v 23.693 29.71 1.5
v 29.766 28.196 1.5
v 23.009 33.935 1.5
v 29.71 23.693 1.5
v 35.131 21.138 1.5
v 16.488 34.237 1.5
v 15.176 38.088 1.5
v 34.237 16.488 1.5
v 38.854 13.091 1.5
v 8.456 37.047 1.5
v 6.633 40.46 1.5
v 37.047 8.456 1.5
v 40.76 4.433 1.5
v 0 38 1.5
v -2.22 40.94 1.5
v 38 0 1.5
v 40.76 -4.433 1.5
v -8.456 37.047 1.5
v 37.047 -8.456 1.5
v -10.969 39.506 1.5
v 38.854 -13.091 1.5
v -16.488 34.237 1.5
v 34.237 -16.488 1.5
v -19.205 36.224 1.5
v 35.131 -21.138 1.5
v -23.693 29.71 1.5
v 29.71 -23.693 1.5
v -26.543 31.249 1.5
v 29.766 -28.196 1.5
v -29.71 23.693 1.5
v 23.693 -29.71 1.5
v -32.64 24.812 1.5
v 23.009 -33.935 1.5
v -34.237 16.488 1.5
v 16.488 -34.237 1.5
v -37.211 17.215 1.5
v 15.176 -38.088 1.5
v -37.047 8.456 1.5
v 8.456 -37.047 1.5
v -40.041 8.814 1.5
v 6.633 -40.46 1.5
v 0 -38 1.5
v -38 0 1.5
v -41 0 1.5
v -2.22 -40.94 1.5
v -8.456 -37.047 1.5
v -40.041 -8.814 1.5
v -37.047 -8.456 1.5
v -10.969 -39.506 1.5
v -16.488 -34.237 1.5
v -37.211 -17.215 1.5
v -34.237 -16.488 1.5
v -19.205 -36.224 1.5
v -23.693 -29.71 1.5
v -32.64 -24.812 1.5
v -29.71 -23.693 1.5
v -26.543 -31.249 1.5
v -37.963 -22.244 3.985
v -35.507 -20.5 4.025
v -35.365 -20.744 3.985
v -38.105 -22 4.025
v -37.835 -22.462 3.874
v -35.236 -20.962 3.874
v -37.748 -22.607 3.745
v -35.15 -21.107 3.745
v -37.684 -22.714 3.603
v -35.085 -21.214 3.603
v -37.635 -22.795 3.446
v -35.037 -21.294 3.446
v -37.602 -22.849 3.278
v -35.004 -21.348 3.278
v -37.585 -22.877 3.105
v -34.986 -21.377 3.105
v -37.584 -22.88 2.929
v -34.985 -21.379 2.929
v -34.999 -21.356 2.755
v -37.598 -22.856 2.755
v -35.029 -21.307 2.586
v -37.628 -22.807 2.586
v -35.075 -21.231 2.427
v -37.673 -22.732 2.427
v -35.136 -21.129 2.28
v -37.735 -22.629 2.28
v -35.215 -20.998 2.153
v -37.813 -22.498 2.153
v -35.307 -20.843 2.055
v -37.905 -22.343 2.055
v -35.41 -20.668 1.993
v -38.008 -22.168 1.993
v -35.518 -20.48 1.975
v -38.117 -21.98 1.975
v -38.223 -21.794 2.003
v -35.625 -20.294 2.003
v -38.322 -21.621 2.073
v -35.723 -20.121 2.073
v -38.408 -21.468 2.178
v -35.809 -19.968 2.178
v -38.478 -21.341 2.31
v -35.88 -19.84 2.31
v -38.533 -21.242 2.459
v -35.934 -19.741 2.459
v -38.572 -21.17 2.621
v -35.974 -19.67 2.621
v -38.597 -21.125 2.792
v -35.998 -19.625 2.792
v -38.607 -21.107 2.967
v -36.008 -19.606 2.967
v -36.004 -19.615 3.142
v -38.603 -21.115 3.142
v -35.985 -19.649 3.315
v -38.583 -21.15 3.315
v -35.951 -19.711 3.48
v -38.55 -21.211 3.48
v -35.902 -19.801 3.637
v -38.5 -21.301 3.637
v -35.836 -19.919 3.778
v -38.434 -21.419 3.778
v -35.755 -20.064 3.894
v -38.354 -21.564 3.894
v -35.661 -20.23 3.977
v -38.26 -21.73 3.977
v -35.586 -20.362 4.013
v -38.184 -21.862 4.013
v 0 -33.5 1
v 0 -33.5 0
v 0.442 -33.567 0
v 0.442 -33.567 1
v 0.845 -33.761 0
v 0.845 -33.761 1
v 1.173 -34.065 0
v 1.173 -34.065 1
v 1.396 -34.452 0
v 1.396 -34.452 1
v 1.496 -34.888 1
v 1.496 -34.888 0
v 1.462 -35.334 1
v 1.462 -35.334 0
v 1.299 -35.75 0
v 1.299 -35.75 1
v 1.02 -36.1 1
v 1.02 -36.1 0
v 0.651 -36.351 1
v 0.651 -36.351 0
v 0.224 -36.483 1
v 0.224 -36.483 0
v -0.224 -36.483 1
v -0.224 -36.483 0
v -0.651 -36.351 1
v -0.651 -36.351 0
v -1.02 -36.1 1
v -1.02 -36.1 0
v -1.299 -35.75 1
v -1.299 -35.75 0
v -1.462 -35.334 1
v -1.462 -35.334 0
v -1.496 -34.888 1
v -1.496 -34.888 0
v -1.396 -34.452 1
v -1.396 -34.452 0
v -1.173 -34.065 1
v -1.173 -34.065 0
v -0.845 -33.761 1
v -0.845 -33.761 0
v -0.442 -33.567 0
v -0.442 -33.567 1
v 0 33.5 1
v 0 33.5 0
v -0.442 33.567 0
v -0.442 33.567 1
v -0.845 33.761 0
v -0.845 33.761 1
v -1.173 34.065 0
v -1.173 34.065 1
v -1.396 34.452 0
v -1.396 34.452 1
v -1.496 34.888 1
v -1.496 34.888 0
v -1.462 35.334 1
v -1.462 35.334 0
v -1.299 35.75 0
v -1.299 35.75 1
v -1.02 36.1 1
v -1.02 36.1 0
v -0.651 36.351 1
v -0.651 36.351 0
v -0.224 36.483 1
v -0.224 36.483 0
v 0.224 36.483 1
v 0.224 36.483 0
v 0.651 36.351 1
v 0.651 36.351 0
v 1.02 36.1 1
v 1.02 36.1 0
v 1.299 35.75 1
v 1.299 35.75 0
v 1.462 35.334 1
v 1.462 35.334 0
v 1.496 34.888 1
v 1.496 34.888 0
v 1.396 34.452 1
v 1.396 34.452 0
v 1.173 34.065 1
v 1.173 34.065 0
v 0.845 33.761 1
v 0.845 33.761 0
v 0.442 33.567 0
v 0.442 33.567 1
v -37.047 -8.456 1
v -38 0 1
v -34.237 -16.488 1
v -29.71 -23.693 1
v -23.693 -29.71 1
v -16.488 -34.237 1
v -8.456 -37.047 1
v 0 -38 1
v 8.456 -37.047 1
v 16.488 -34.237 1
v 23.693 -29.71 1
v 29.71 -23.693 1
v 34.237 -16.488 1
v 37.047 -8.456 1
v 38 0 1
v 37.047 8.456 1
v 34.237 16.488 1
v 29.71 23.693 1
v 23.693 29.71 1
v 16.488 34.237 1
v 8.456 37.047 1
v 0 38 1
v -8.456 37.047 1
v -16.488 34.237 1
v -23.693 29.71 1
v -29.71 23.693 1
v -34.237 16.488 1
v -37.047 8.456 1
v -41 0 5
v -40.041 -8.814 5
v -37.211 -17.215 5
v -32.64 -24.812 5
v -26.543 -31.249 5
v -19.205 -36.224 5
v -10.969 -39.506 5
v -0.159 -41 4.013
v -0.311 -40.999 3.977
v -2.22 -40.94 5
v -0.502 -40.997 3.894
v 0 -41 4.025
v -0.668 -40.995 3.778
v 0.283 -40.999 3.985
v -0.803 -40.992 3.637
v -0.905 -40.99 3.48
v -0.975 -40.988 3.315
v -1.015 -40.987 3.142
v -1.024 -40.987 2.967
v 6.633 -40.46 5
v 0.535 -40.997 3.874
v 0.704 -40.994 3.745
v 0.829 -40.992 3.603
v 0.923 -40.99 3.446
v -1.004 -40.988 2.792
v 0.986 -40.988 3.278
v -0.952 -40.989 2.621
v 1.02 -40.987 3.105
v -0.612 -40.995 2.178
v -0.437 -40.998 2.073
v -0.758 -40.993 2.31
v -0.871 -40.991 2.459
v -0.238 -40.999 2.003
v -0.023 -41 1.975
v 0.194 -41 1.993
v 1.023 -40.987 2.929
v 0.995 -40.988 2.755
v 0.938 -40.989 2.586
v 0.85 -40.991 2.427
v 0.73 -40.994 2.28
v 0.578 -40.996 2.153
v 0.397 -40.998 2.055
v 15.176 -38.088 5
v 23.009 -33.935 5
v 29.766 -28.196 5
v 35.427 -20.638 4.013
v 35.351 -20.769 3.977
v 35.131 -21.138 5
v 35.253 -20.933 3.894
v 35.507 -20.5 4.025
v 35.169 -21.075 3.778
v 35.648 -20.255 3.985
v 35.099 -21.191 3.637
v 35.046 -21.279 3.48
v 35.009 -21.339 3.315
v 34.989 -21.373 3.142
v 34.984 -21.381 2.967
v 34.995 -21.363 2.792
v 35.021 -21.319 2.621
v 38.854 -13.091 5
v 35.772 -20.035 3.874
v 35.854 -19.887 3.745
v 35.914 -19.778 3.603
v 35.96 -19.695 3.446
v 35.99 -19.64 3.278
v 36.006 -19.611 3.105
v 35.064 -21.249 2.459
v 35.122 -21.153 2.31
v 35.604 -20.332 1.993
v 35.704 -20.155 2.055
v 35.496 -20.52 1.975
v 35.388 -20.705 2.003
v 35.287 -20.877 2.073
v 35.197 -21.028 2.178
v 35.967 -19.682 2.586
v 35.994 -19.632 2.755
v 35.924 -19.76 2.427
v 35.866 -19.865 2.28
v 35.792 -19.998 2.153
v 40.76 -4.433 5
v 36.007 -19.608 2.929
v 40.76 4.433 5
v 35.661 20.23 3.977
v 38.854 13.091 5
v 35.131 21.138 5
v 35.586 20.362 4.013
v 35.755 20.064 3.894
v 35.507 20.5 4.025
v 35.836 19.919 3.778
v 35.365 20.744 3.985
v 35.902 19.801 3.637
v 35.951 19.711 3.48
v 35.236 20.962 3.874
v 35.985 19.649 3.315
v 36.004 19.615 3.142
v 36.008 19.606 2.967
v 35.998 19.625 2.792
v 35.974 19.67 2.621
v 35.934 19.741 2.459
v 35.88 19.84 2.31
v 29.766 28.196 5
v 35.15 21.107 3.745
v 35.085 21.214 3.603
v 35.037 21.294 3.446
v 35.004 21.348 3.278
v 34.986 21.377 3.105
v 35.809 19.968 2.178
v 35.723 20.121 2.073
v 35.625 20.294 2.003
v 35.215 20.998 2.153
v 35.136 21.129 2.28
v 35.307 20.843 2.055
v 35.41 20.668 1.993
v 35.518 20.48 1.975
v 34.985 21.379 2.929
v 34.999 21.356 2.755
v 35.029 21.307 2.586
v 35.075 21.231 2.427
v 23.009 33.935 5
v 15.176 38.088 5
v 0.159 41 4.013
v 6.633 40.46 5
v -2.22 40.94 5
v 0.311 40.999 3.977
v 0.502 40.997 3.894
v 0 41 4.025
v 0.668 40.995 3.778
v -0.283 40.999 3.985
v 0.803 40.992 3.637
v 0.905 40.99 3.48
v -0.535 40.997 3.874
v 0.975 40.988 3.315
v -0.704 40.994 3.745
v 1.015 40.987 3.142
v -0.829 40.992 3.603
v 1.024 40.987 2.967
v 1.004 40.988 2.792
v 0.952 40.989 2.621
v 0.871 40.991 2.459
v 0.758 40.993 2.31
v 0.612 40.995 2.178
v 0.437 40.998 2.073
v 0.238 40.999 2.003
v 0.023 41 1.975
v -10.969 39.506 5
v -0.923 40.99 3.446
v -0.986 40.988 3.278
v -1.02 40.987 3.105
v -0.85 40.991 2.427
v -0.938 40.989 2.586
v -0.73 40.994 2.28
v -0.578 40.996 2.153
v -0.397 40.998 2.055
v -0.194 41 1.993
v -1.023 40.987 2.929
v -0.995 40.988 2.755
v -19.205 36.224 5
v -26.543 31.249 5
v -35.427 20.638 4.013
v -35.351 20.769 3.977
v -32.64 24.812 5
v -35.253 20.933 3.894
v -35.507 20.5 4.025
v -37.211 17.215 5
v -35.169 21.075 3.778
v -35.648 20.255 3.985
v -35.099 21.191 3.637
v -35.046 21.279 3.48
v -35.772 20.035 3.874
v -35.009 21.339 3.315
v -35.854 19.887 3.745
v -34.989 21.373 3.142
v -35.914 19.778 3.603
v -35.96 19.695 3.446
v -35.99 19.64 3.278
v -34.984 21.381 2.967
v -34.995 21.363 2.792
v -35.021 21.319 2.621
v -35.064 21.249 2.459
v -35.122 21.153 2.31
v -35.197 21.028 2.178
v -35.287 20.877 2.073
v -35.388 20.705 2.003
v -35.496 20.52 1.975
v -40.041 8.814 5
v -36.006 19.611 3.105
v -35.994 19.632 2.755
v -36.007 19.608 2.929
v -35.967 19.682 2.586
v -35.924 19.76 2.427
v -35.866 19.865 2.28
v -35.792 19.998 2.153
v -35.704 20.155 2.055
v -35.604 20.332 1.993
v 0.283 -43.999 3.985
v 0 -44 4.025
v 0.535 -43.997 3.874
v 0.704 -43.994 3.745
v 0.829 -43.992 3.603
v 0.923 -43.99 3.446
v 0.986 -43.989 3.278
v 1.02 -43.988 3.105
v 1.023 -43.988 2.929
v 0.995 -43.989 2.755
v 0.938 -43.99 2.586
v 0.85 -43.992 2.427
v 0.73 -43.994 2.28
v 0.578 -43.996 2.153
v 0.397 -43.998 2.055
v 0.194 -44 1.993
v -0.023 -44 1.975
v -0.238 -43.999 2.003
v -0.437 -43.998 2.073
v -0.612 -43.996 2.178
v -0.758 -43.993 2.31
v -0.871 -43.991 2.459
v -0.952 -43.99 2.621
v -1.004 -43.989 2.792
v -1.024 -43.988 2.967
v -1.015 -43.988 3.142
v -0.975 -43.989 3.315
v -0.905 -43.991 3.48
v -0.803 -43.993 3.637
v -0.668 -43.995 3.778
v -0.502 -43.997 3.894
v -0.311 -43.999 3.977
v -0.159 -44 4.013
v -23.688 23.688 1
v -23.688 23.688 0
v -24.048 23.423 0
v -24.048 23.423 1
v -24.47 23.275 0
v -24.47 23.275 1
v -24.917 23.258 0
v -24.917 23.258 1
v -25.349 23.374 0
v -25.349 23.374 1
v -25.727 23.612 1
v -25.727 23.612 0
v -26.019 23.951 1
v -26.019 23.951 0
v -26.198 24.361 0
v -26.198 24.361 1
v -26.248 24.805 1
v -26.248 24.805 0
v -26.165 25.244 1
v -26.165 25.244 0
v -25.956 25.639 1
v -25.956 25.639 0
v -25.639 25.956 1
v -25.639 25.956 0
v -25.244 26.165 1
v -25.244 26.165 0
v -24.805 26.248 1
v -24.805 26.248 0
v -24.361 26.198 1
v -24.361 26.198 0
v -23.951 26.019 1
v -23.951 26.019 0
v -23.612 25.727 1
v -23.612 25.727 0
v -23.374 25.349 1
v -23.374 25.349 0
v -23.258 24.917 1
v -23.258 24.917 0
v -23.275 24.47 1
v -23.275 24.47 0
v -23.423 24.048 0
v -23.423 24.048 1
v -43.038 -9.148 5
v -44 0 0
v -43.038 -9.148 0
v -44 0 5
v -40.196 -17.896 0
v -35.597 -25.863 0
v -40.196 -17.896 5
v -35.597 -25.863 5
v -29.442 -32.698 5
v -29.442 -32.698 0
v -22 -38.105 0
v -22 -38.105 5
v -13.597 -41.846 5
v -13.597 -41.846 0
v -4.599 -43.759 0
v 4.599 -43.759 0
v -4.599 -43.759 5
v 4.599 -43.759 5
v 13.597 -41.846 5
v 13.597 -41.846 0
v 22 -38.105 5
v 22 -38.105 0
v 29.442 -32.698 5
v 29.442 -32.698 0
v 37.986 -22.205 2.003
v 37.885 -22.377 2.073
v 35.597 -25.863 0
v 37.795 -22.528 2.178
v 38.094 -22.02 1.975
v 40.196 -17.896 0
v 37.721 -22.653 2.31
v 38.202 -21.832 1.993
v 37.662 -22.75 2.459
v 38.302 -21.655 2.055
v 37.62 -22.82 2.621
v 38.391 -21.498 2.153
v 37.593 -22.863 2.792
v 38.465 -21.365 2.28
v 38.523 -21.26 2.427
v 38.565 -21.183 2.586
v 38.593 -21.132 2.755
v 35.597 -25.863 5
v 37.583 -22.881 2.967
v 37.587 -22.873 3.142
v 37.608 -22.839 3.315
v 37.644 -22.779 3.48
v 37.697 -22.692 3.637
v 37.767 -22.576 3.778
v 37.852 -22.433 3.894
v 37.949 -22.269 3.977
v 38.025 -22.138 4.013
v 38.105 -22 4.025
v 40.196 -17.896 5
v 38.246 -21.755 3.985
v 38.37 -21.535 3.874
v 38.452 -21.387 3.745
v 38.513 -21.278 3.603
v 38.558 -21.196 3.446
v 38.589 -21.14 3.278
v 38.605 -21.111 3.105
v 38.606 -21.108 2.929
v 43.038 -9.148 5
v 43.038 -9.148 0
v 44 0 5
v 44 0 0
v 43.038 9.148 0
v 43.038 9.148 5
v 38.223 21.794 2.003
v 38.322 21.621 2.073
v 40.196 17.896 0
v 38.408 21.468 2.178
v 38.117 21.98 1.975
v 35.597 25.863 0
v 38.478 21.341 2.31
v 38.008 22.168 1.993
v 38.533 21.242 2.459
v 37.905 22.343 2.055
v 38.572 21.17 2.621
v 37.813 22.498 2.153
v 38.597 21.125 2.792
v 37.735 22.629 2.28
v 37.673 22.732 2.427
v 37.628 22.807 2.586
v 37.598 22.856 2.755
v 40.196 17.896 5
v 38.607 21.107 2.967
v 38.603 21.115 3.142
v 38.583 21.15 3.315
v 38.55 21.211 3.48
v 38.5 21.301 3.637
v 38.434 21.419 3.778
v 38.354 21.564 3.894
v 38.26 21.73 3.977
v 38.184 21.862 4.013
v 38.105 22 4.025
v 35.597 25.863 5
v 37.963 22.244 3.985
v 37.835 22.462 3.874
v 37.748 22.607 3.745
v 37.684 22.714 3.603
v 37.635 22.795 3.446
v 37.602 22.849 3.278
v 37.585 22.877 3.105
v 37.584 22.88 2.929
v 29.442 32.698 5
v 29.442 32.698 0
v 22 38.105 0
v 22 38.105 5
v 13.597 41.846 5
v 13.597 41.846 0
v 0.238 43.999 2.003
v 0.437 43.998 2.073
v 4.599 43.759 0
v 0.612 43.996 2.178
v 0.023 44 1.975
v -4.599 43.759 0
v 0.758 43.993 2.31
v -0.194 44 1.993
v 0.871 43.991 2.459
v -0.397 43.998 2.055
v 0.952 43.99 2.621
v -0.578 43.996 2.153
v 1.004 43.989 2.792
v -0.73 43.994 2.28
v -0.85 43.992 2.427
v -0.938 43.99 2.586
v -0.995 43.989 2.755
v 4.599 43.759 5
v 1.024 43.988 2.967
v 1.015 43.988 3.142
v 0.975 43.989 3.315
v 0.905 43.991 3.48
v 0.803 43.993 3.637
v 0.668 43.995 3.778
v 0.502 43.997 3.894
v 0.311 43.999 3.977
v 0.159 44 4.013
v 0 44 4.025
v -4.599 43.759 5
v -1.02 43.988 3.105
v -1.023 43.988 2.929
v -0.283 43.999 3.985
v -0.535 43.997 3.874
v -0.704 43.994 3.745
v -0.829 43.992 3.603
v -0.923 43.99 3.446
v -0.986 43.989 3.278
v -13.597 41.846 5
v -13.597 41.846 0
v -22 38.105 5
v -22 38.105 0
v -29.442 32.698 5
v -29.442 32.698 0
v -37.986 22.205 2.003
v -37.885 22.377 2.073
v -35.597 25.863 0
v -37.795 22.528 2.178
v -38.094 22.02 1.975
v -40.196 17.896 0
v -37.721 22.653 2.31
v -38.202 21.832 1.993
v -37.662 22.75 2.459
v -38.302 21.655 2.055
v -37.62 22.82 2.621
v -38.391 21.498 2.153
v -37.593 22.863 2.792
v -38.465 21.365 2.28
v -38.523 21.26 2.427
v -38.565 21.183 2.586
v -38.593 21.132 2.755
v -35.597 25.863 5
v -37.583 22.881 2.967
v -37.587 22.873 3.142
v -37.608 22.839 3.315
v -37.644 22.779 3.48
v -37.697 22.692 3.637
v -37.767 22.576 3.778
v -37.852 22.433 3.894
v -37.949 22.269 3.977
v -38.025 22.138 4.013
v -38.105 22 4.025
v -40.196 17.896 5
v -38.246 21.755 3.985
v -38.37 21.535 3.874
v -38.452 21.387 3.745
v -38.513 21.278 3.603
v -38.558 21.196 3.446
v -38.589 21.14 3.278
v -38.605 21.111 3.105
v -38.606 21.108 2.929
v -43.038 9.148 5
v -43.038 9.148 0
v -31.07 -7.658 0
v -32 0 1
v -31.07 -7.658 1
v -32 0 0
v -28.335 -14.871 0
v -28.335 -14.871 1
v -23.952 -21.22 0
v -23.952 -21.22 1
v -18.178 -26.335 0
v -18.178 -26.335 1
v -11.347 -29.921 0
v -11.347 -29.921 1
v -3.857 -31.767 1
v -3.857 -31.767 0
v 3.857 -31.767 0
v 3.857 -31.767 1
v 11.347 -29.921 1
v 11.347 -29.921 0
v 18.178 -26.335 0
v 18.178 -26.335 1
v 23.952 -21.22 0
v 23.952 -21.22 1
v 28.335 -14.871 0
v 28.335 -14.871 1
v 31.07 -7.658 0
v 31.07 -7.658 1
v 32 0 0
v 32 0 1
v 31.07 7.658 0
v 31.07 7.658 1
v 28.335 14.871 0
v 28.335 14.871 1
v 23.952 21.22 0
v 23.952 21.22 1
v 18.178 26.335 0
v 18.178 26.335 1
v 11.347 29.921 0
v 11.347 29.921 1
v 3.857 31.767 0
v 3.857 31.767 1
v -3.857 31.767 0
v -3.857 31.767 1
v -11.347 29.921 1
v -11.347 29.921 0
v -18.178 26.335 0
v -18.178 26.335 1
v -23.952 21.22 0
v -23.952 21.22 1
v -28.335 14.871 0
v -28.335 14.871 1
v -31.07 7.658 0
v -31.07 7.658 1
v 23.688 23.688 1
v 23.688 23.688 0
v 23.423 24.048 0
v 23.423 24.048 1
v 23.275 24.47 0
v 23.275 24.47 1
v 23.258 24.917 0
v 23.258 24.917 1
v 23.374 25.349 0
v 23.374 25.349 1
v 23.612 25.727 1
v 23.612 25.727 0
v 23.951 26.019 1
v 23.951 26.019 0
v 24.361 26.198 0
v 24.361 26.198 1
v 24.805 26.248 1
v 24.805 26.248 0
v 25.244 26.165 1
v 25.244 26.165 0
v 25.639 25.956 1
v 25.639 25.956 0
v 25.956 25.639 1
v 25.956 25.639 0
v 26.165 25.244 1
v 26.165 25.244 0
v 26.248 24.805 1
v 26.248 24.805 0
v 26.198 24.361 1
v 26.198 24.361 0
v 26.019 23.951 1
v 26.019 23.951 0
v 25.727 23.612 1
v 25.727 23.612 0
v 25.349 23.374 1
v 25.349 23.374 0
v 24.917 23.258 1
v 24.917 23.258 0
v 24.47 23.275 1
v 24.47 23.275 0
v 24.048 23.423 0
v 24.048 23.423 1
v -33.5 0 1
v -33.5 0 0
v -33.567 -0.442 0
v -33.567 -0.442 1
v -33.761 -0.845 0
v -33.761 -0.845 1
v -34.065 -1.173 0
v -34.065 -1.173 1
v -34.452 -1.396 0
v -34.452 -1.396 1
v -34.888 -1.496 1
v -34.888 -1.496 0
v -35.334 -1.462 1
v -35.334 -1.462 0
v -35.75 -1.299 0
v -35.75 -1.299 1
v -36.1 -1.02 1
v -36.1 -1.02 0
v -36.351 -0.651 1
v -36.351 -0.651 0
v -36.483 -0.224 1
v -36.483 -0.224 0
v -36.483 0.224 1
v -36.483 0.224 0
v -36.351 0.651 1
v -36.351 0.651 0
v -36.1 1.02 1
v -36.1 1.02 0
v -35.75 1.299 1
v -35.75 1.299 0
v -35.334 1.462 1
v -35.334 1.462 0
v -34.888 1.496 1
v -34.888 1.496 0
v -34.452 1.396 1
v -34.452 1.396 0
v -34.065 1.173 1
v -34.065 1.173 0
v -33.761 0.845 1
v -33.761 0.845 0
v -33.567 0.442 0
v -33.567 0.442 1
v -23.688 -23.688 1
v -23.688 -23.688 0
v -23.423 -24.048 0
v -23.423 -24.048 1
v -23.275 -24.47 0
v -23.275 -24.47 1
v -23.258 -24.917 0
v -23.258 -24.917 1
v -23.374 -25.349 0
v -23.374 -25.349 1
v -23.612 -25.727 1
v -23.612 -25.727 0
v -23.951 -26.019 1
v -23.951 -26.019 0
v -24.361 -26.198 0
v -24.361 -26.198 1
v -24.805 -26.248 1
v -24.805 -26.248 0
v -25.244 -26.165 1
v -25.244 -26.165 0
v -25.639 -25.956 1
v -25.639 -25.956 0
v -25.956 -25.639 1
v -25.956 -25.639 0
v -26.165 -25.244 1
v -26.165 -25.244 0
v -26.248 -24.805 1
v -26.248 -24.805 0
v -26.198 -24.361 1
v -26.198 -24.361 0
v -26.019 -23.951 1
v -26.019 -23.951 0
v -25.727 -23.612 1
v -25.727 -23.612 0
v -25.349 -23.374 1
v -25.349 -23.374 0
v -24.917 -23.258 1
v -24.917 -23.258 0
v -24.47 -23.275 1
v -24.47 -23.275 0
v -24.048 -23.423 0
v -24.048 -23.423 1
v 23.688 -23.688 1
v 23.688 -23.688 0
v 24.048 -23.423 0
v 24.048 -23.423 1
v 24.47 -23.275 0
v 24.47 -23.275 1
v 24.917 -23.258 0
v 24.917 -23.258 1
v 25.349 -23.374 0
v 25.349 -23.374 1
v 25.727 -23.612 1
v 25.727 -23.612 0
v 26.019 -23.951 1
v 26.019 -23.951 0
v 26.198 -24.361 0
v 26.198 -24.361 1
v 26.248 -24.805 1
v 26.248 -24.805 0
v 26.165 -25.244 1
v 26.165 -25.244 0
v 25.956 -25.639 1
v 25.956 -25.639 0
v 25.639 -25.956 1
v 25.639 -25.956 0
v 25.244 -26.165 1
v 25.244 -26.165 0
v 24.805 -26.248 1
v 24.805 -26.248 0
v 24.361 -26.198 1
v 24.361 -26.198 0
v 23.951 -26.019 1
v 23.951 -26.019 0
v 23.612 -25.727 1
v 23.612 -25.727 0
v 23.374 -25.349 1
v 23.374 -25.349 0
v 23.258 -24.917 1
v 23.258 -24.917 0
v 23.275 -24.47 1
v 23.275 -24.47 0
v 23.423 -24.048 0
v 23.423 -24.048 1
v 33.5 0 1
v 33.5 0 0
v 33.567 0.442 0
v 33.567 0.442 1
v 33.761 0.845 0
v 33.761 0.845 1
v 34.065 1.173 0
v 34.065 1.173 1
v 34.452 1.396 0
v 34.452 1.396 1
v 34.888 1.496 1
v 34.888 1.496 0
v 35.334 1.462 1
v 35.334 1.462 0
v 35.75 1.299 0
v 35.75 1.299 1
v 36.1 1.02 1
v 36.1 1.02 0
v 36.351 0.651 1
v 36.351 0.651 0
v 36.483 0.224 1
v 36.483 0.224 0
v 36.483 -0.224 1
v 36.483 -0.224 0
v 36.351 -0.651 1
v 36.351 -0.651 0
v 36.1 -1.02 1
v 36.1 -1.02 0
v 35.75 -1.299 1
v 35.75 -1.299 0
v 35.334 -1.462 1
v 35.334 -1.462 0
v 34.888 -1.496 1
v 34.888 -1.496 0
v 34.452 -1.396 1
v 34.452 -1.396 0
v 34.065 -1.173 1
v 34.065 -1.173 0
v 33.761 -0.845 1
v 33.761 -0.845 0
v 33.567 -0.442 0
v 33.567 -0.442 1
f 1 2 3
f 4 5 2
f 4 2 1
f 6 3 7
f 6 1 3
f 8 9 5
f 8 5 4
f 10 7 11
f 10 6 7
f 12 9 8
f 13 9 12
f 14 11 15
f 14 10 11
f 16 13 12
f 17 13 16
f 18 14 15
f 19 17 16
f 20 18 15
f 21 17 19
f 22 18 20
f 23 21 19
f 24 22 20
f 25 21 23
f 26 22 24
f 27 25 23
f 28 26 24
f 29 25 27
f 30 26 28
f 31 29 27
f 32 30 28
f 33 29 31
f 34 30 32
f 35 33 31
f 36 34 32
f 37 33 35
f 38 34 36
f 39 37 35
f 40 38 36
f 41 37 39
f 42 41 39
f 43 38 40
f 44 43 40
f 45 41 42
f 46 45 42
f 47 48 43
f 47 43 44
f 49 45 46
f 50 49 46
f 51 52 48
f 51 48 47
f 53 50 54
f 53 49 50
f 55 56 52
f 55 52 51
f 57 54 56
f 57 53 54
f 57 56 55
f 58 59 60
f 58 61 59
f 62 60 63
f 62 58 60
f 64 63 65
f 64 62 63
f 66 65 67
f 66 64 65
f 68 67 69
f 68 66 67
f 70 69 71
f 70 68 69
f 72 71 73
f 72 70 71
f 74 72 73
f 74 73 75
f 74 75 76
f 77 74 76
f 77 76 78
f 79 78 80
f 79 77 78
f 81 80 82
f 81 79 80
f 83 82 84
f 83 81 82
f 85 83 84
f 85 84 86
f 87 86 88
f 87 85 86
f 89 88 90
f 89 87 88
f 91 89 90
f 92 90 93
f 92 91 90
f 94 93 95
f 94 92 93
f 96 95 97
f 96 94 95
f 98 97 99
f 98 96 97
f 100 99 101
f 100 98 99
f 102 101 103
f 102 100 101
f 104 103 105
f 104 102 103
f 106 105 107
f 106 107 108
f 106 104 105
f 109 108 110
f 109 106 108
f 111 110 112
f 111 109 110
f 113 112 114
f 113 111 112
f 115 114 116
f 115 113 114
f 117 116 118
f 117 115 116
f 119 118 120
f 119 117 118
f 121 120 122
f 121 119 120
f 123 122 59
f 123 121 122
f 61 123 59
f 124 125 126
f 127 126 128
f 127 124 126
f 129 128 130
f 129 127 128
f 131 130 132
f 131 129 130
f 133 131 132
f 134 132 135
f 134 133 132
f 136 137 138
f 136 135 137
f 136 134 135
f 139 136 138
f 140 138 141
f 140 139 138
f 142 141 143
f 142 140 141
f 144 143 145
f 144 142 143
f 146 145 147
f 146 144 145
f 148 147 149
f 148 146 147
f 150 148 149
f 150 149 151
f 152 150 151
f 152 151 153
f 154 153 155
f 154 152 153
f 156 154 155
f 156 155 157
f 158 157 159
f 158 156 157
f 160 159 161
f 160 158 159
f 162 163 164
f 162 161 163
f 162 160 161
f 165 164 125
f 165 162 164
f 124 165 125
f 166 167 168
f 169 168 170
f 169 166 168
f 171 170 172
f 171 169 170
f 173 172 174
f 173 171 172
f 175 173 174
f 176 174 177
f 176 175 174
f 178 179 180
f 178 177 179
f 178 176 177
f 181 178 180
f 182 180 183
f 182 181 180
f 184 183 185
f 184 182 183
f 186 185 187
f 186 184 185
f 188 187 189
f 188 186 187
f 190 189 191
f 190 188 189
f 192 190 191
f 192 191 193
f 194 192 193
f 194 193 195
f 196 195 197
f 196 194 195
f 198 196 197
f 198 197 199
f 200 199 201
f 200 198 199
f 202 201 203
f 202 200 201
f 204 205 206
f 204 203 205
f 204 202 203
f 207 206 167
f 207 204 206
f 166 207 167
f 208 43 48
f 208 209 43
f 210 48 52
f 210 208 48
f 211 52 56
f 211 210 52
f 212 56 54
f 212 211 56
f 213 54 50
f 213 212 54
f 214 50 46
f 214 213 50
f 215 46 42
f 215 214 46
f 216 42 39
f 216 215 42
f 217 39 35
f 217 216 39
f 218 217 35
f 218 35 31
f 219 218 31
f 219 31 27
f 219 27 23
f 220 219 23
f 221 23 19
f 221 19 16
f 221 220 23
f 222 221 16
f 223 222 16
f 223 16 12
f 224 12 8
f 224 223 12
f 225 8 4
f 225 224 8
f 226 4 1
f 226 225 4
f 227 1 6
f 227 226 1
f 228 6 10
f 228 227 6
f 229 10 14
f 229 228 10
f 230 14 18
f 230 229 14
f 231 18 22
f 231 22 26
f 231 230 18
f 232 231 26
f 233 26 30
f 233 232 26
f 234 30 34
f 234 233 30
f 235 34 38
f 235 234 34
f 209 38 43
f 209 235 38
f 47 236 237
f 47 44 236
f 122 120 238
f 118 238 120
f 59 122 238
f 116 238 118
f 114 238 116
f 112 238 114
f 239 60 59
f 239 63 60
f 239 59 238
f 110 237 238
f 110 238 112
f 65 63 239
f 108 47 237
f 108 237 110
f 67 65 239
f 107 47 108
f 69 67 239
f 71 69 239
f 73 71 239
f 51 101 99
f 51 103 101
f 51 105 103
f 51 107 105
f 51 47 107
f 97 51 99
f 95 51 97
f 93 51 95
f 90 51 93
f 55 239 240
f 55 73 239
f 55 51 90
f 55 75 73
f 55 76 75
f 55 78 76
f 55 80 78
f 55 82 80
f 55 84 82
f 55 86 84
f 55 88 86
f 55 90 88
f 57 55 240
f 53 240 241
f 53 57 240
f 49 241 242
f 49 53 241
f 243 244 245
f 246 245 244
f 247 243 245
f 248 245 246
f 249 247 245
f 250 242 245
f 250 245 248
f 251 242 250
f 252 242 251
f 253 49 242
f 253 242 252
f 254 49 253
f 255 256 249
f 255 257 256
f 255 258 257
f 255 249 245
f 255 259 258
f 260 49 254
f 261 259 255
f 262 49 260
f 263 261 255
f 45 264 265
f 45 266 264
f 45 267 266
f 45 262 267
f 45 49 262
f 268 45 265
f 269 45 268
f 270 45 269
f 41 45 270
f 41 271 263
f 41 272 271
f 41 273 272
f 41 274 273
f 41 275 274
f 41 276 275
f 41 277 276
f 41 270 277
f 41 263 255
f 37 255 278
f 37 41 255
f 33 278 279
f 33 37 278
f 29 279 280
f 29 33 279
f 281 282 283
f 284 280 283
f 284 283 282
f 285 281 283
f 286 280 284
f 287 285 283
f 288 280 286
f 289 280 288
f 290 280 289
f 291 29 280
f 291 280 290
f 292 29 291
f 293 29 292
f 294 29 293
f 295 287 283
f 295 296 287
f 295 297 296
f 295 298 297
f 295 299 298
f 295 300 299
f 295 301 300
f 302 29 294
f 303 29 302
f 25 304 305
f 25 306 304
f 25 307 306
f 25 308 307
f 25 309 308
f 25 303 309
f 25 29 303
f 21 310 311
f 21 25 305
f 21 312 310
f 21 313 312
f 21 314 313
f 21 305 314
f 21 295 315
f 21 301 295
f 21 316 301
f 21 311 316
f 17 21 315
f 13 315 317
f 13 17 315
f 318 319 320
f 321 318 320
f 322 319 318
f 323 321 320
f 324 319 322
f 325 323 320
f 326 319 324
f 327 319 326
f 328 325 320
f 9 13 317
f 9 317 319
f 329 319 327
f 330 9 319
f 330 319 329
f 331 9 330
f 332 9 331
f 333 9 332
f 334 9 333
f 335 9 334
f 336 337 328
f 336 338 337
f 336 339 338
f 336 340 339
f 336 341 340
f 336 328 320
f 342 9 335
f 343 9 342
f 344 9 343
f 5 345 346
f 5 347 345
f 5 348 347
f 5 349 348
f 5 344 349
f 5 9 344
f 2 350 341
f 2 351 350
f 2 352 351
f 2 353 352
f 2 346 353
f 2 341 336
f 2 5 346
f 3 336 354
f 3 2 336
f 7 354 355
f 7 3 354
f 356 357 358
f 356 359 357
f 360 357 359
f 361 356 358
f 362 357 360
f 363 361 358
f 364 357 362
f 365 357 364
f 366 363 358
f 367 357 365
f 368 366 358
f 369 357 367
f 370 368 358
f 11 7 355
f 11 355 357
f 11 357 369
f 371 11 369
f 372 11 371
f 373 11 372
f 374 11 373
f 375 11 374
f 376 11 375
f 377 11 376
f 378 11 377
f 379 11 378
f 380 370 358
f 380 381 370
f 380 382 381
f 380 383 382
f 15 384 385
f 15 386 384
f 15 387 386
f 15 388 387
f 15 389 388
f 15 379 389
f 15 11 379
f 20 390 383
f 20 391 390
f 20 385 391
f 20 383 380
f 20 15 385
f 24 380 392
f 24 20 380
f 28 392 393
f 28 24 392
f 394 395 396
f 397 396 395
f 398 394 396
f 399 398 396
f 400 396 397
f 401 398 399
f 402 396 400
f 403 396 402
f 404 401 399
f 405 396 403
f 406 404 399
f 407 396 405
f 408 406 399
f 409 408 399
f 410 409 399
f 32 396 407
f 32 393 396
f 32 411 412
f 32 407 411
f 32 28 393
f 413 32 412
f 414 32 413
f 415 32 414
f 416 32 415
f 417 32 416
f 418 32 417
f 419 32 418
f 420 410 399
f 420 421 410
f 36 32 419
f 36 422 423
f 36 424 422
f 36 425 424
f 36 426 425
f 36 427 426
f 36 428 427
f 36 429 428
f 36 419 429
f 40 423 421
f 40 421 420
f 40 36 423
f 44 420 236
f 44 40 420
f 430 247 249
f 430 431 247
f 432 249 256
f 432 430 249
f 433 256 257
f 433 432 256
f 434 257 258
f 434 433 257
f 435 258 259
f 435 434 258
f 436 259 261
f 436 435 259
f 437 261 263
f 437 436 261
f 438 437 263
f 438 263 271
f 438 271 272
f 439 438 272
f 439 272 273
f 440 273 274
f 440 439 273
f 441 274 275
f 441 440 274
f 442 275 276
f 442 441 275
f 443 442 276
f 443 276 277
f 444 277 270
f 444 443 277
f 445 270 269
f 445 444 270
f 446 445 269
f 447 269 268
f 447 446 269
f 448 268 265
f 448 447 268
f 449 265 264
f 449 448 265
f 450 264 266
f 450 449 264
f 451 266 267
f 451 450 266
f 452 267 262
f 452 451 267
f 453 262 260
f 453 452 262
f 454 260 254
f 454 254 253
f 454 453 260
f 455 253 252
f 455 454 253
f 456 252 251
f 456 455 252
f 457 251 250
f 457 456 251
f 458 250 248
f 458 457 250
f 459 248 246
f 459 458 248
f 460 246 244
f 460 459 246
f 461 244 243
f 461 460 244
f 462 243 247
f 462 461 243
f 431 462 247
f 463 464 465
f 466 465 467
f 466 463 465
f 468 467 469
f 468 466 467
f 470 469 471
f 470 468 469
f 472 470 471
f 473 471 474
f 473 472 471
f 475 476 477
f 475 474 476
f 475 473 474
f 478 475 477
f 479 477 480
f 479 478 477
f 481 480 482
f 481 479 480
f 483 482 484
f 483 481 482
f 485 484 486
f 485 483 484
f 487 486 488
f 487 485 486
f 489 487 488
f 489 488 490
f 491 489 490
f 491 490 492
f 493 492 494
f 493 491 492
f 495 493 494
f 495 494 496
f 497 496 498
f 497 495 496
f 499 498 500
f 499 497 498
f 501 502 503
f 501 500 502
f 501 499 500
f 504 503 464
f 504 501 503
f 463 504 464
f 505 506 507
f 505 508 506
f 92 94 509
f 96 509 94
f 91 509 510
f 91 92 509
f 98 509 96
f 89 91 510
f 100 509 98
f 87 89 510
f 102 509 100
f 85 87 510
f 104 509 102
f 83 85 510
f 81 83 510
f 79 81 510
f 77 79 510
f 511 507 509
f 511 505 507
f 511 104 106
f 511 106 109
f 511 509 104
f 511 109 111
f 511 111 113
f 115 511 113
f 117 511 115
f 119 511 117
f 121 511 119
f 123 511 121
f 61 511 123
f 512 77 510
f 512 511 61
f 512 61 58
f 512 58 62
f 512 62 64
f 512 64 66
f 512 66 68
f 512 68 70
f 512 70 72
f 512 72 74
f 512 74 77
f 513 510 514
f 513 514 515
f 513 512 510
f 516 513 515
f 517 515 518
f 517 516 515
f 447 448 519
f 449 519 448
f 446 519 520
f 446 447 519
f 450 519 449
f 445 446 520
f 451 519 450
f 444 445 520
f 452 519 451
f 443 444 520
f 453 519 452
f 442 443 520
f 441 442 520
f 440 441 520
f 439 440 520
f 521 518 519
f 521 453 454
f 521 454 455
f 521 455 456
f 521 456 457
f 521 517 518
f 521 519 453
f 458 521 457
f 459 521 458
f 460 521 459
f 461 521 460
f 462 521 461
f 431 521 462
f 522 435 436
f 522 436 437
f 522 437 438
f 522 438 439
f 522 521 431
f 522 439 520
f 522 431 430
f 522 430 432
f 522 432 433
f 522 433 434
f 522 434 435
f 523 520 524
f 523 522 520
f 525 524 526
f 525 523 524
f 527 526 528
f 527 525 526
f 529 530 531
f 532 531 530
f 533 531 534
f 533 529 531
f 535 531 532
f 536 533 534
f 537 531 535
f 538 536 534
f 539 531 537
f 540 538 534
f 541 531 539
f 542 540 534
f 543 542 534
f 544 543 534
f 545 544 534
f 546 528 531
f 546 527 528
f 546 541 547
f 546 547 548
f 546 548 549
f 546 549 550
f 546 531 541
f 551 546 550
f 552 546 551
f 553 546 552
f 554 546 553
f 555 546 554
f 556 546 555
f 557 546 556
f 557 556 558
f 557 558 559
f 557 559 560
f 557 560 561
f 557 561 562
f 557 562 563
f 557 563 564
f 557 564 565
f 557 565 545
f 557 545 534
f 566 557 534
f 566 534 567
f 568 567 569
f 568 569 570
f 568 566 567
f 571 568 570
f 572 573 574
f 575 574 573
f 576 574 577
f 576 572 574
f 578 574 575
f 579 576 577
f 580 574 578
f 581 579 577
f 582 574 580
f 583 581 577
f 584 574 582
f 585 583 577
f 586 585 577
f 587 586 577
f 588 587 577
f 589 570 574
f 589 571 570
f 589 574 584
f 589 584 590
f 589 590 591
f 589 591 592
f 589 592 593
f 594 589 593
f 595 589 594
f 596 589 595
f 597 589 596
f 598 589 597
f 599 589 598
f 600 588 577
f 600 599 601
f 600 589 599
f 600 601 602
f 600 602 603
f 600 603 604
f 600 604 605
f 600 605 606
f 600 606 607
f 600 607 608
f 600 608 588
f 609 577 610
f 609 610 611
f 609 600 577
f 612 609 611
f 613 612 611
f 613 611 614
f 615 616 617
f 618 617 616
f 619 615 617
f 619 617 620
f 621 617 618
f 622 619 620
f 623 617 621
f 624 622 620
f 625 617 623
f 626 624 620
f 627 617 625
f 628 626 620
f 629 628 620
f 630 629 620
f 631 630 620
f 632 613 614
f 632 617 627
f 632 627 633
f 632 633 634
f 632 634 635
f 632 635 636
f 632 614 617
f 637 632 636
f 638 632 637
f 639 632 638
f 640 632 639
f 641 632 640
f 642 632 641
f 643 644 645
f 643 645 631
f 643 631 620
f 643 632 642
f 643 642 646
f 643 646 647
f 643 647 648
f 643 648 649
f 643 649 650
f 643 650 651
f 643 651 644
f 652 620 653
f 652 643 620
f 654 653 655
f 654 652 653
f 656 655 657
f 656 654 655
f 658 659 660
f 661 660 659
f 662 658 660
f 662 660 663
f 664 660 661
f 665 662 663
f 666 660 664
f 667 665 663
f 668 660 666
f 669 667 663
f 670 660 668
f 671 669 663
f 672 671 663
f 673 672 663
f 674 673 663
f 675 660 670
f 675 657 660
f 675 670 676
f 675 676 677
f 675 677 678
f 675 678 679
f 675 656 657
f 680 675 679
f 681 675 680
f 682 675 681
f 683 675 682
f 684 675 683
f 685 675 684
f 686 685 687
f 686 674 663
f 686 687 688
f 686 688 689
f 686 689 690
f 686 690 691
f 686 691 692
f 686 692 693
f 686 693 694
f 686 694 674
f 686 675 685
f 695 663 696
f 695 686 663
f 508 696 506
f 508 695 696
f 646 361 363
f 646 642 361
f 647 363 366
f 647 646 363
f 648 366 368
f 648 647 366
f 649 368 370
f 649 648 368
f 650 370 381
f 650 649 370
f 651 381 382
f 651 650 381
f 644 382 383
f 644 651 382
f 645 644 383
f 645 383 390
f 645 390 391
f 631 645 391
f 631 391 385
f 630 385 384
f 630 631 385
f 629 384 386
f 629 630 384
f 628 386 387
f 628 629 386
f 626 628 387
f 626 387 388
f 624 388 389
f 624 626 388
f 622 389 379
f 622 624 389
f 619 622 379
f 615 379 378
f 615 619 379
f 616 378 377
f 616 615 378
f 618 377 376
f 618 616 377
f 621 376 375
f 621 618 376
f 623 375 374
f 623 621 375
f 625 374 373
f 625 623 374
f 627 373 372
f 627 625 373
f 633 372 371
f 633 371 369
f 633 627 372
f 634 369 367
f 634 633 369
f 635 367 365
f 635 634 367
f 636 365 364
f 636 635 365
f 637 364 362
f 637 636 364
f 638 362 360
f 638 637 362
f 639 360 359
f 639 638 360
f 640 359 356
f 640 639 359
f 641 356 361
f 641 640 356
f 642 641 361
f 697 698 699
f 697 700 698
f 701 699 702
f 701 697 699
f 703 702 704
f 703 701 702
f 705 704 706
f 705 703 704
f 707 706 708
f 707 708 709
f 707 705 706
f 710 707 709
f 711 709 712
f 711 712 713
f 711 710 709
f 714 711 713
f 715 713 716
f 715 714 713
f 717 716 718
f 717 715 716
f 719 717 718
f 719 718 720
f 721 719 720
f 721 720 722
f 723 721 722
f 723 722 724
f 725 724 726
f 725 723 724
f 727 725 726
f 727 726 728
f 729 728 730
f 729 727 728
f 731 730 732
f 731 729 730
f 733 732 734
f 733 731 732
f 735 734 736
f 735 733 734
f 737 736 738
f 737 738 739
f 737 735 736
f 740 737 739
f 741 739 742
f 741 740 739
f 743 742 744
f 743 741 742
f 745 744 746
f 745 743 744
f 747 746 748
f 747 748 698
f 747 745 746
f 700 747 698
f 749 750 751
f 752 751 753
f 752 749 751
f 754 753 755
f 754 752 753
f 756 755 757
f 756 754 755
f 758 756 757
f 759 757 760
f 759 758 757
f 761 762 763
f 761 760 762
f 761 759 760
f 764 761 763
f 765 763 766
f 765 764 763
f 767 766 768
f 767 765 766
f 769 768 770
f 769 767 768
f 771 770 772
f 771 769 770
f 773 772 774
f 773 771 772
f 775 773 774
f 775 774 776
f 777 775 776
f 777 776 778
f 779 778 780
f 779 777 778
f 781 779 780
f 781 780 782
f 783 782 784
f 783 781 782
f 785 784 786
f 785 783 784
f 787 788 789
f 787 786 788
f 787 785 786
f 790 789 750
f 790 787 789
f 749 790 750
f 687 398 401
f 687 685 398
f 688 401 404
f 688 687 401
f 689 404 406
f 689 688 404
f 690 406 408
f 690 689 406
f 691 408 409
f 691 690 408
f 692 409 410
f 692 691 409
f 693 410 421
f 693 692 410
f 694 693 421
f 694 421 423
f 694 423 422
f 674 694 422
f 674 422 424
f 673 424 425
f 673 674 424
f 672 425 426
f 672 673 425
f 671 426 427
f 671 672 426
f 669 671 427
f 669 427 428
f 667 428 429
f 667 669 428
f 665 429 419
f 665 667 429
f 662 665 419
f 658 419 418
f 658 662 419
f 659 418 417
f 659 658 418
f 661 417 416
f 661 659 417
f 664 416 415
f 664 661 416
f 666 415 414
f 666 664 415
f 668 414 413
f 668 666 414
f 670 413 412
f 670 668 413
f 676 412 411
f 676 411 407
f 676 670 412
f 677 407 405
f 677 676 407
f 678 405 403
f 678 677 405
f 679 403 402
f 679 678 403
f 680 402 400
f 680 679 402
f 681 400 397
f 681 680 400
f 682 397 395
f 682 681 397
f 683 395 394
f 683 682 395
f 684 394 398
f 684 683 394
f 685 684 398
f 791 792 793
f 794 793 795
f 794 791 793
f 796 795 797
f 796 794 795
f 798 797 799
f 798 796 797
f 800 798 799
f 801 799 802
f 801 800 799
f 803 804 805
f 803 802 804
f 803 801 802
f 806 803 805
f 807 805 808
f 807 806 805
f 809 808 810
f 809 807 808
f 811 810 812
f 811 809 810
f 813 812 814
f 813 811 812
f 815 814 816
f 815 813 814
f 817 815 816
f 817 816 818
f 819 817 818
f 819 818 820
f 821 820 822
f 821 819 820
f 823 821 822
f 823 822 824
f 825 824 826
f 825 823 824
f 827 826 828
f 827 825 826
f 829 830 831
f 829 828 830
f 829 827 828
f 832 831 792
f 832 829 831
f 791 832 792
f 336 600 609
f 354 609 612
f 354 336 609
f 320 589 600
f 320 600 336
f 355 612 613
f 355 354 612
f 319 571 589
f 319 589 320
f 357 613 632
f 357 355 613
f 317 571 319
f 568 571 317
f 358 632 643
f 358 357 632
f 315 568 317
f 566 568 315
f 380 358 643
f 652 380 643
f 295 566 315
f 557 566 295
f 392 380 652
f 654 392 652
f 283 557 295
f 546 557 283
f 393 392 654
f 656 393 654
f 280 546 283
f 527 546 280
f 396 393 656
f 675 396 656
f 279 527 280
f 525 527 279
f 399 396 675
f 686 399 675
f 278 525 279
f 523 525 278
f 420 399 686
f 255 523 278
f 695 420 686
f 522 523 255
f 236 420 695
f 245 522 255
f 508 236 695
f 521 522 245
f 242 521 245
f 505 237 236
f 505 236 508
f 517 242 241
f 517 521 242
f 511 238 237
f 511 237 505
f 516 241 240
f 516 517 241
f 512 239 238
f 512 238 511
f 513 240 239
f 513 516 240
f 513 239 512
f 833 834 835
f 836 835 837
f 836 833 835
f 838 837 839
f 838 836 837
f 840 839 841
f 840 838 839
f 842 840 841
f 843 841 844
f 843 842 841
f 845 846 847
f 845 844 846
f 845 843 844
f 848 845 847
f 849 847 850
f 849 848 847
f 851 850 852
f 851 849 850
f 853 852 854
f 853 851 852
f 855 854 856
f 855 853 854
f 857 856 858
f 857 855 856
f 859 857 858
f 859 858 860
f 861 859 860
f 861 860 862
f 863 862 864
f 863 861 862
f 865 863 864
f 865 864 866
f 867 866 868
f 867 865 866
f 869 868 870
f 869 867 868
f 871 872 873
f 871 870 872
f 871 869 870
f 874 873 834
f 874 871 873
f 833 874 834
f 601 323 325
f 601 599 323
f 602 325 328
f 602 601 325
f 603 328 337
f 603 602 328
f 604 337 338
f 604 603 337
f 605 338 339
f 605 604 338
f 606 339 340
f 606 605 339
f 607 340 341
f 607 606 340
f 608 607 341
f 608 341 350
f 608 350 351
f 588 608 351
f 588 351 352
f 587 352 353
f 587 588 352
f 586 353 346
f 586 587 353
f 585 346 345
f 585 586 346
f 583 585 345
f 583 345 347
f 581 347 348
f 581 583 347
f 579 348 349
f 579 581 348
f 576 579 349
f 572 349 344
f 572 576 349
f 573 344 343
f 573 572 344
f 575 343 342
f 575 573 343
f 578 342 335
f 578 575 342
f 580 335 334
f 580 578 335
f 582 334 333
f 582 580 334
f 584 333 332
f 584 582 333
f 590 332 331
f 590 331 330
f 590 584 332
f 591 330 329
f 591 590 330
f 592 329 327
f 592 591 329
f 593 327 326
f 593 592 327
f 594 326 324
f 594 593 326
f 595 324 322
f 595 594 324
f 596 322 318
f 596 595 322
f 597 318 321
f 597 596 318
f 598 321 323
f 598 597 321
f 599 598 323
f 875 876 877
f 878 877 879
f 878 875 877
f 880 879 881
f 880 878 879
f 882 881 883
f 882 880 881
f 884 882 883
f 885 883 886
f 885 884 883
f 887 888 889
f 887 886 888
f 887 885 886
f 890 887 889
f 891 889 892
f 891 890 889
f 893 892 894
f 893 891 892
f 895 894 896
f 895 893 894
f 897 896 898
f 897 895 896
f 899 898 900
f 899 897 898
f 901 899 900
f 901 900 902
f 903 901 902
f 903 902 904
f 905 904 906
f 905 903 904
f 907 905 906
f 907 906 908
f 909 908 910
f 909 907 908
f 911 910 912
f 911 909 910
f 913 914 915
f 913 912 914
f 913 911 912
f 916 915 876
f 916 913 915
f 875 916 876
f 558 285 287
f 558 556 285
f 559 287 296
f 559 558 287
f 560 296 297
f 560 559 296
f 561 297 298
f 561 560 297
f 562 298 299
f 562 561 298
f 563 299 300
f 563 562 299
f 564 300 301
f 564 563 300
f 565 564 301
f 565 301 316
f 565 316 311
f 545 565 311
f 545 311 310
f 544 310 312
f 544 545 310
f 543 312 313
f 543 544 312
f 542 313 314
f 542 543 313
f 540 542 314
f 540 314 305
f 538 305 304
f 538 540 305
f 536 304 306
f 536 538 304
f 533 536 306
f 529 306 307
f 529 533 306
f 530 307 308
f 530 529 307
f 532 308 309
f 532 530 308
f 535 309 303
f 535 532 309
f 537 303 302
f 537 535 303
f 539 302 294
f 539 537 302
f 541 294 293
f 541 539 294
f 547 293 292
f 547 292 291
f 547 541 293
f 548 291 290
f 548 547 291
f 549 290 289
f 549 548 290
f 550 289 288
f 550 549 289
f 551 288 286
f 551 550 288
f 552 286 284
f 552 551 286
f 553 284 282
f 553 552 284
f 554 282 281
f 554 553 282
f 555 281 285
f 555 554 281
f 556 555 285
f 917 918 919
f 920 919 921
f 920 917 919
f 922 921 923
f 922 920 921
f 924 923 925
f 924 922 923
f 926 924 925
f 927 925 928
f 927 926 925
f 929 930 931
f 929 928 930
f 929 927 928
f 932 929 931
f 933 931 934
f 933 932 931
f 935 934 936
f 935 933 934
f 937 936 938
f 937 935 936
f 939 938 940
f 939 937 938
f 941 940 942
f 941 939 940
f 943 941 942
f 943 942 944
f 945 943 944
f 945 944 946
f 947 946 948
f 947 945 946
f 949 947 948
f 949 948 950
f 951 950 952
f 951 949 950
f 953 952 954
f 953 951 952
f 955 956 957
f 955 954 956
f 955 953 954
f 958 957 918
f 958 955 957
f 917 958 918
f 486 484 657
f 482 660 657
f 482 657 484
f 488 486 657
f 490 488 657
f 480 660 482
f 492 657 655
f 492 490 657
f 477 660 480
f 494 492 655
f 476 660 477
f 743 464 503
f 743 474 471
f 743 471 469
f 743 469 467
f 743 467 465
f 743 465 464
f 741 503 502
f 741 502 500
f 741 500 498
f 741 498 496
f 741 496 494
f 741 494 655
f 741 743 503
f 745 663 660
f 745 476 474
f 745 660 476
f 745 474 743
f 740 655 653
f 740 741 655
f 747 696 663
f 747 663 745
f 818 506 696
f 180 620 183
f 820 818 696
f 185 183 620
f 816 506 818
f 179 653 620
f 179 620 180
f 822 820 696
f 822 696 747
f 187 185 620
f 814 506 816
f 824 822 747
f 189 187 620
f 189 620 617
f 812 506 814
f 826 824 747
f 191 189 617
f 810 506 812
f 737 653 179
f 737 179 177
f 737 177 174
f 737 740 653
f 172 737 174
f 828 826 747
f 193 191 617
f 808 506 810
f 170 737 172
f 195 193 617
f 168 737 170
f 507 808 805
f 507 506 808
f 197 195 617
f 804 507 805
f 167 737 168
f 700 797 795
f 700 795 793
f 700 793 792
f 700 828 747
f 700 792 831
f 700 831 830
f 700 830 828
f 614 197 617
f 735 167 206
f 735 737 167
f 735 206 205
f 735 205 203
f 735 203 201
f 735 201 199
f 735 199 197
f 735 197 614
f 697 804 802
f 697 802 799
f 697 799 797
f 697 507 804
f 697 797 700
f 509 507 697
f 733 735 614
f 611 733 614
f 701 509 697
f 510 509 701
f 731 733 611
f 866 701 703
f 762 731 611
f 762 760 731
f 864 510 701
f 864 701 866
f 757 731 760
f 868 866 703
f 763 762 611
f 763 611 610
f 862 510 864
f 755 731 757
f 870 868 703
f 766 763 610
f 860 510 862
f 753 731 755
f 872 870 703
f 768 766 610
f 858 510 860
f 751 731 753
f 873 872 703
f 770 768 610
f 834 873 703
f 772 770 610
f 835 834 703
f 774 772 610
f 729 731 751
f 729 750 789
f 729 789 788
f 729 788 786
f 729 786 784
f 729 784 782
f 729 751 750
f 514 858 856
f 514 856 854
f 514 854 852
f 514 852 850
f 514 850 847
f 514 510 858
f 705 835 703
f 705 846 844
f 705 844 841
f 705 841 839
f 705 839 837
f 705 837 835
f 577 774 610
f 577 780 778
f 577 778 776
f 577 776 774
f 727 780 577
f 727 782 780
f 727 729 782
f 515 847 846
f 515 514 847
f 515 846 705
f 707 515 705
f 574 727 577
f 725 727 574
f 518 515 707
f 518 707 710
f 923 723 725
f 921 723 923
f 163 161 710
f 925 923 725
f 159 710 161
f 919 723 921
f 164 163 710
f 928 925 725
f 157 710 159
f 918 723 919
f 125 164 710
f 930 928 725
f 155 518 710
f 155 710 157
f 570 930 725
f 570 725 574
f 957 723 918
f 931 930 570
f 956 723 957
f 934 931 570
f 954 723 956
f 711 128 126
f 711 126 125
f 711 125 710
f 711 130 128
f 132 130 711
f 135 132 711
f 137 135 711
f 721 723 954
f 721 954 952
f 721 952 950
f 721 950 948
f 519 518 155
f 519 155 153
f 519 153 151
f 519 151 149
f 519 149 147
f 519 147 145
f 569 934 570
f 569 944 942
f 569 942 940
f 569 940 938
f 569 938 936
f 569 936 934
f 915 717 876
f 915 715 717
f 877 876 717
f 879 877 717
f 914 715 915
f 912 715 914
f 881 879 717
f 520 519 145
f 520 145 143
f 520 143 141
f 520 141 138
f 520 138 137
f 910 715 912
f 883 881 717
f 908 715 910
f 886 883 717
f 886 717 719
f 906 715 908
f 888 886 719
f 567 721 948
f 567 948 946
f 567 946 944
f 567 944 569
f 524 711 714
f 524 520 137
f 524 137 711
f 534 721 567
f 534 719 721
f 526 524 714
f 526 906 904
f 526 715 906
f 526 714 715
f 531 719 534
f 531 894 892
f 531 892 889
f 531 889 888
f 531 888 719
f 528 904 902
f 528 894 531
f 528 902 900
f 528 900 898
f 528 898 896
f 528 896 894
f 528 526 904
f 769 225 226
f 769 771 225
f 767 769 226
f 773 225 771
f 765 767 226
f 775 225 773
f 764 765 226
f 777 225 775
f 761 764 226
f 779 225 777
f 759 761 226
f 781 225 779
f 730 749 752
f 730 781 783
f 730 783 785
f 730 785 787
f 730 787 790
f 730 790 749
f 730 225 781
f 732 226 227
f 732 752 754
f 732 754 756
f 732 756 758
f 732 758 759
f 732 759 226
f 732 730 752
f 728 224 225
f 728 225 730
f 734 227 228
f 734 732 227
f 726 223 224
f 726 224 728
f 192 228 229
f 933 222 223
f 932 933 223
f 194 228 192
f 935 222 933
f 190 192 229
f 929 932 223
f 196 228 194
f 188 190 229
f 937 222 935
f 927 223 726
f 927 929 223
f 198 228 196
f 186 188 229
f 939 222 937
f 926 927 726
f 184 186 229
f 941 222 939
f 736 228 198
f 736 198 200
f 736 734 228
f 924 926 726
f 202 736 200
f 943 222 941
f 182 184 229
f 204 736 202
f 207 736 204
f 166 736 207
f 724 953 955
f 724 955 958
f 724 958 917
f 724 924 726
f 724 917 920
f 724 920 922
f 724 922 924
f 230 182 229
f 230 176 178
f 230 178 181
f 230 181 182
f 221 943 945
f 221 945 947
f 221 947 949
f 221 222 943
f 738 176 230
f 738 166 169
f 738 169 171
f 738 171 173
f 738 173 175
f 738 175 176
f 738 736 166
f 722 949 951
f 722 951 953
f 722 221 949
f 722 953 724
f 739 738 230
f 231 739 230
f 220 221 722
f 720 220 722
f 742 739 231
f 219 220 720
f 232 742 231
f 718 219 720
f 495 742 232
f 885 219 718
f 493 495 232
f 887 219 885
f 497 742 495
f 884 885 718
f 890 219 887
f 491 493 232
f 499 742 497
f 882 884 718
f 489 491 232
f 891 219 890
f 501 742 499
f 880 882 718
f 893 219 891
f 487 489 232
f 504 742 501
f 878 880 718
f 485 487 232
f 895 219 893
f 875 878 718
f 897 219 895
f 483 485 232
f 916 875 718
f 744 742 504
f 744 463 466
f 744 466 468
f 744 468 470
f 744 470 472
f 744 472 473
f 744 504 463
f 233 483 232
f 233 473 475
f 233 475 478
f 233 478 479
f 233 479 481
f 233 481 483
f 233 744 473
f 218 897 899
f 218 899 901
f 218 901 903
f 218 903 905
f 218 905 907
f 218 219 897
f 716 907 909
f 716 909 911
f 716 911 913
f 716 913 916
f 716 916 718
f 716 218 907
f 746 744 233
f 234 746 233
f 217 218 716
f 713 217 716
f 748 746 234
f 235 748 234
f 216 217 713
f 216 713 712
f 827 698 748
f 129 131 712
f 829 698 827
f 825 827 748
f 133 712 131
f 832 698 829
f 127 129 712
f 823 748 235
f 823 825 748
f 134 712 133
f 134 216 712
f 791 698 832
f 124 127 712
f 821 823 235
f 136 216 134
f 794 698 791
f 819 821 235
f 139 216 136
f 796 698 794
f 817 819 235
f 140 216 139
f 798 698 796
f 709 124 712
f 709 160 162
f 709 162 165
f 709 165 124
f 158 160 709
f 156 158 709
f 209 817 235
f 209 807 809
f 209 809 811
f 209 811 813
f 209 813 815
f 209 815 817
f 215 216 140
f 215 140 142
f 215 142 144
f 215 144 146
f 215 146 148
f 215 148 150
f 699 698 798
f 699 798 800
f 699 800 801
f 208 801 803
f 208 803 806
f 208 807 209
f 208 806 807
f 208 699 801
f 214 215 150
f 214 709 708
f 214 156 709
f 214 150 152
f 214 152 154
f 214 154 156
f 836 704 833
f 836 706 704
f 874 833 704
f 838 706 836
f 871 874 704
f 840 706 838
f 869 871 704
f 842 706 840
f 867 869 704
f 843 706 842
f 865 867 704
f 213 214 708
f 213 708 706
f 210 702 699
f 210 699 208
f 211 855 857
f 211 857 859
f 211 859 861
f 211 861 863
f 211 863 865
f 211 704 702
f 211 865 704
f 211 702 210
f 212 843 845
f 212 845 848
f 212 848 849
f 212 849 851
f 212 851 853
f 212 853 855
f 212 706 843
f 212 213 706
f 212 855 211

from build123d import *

# Parameters (mm, degrees)
CIRPATTERN1_COUNT = 8
CIRPATTERN2_COUNT = 6


with BuildPart() as part:
    # Sketch1 → Revolve1 (revolve)
    with BuildSketch(Plane(origin=(0, 0, 0), x_dir=(0, 0, -1), z_dir=(1, 0, 0)), mode=Mode.PRIVATE) as revolve1_sk:
        Polygon((0, 32), (0, 44), (-5, 44), (-5, 41), (-1.5, 41), (-1.5, 38), (-1, 38), (-1, 32), align=None)
    revolve(revolve1_sk.sketch.rotate(Axis((0, 0, 0), (0, 0, 1)), 90), axis=Axis((0, 0, 0), (0, 0, 1)))

    # Sketch2 → Ø3.0 (3) Diameter Hole1 (revolve, cut)
    with BuildSketch(Plane(origin=(0, 35, 1), x_dir=(0, -1, 0), z_dir=(1, 0, 0))):
        Polygon((0, 0), (0, 2.401290929), (1.5, 1.5), (1.5, 0), align=None)
    f_3_0_3_diameter_hole1 = revolve(axis=Axis((0, 35, 7.35), (0, 0, -1)), mode=Mode.SUBTRACT)

    # CirPattern1: Ø3.0 (3) Diameter Hole1 ×8 about axis
    cirpattern1_axis = Axis((0, 0, 0), (0, 0, 1))
    for i in range(1, CIRPATTERN1_COUNT):
        add(f_3_0_3_diameter_hole1.rotate(cirpattern1_axis, i * 360 / CIRPATTERN1_COUNT), mode=Mode.SUBTRACT)

    # Sketch4 → M2.5x0.45 Tapped Hole1 (revolve, cut)
    with BuildSketch(Plane(origin=(0, 44, 3), x_dir=(0, 0, 1), z_dir=(1, 0, 0))):
        Polygon((0, 0), (0, 6.965882135), (1.025, 6.35), (1.025, 0), align=None)
    m2_5x0_45_tapped_hole1 = revolve(axis=Axis((0, 50.35, 3), (0, -1, 0)), mode=Mode.SUBTRACT)

    # CirPattern2: M2.5x0.45 Tapped Hole1 ×6 about axis
    cirpattern2_axis = Axis((0, 0, 5.25), (0, 0, -1))
    for i in range(1, CIRPATTERN2_COUNT):
        add(m2_5x0_45_tapped_hole1.rotate(cirpattern2_axis, i * 360 / CIRPATTERN2_COUNT), mode=Mode.SUBTRACT)


solid = part.part
